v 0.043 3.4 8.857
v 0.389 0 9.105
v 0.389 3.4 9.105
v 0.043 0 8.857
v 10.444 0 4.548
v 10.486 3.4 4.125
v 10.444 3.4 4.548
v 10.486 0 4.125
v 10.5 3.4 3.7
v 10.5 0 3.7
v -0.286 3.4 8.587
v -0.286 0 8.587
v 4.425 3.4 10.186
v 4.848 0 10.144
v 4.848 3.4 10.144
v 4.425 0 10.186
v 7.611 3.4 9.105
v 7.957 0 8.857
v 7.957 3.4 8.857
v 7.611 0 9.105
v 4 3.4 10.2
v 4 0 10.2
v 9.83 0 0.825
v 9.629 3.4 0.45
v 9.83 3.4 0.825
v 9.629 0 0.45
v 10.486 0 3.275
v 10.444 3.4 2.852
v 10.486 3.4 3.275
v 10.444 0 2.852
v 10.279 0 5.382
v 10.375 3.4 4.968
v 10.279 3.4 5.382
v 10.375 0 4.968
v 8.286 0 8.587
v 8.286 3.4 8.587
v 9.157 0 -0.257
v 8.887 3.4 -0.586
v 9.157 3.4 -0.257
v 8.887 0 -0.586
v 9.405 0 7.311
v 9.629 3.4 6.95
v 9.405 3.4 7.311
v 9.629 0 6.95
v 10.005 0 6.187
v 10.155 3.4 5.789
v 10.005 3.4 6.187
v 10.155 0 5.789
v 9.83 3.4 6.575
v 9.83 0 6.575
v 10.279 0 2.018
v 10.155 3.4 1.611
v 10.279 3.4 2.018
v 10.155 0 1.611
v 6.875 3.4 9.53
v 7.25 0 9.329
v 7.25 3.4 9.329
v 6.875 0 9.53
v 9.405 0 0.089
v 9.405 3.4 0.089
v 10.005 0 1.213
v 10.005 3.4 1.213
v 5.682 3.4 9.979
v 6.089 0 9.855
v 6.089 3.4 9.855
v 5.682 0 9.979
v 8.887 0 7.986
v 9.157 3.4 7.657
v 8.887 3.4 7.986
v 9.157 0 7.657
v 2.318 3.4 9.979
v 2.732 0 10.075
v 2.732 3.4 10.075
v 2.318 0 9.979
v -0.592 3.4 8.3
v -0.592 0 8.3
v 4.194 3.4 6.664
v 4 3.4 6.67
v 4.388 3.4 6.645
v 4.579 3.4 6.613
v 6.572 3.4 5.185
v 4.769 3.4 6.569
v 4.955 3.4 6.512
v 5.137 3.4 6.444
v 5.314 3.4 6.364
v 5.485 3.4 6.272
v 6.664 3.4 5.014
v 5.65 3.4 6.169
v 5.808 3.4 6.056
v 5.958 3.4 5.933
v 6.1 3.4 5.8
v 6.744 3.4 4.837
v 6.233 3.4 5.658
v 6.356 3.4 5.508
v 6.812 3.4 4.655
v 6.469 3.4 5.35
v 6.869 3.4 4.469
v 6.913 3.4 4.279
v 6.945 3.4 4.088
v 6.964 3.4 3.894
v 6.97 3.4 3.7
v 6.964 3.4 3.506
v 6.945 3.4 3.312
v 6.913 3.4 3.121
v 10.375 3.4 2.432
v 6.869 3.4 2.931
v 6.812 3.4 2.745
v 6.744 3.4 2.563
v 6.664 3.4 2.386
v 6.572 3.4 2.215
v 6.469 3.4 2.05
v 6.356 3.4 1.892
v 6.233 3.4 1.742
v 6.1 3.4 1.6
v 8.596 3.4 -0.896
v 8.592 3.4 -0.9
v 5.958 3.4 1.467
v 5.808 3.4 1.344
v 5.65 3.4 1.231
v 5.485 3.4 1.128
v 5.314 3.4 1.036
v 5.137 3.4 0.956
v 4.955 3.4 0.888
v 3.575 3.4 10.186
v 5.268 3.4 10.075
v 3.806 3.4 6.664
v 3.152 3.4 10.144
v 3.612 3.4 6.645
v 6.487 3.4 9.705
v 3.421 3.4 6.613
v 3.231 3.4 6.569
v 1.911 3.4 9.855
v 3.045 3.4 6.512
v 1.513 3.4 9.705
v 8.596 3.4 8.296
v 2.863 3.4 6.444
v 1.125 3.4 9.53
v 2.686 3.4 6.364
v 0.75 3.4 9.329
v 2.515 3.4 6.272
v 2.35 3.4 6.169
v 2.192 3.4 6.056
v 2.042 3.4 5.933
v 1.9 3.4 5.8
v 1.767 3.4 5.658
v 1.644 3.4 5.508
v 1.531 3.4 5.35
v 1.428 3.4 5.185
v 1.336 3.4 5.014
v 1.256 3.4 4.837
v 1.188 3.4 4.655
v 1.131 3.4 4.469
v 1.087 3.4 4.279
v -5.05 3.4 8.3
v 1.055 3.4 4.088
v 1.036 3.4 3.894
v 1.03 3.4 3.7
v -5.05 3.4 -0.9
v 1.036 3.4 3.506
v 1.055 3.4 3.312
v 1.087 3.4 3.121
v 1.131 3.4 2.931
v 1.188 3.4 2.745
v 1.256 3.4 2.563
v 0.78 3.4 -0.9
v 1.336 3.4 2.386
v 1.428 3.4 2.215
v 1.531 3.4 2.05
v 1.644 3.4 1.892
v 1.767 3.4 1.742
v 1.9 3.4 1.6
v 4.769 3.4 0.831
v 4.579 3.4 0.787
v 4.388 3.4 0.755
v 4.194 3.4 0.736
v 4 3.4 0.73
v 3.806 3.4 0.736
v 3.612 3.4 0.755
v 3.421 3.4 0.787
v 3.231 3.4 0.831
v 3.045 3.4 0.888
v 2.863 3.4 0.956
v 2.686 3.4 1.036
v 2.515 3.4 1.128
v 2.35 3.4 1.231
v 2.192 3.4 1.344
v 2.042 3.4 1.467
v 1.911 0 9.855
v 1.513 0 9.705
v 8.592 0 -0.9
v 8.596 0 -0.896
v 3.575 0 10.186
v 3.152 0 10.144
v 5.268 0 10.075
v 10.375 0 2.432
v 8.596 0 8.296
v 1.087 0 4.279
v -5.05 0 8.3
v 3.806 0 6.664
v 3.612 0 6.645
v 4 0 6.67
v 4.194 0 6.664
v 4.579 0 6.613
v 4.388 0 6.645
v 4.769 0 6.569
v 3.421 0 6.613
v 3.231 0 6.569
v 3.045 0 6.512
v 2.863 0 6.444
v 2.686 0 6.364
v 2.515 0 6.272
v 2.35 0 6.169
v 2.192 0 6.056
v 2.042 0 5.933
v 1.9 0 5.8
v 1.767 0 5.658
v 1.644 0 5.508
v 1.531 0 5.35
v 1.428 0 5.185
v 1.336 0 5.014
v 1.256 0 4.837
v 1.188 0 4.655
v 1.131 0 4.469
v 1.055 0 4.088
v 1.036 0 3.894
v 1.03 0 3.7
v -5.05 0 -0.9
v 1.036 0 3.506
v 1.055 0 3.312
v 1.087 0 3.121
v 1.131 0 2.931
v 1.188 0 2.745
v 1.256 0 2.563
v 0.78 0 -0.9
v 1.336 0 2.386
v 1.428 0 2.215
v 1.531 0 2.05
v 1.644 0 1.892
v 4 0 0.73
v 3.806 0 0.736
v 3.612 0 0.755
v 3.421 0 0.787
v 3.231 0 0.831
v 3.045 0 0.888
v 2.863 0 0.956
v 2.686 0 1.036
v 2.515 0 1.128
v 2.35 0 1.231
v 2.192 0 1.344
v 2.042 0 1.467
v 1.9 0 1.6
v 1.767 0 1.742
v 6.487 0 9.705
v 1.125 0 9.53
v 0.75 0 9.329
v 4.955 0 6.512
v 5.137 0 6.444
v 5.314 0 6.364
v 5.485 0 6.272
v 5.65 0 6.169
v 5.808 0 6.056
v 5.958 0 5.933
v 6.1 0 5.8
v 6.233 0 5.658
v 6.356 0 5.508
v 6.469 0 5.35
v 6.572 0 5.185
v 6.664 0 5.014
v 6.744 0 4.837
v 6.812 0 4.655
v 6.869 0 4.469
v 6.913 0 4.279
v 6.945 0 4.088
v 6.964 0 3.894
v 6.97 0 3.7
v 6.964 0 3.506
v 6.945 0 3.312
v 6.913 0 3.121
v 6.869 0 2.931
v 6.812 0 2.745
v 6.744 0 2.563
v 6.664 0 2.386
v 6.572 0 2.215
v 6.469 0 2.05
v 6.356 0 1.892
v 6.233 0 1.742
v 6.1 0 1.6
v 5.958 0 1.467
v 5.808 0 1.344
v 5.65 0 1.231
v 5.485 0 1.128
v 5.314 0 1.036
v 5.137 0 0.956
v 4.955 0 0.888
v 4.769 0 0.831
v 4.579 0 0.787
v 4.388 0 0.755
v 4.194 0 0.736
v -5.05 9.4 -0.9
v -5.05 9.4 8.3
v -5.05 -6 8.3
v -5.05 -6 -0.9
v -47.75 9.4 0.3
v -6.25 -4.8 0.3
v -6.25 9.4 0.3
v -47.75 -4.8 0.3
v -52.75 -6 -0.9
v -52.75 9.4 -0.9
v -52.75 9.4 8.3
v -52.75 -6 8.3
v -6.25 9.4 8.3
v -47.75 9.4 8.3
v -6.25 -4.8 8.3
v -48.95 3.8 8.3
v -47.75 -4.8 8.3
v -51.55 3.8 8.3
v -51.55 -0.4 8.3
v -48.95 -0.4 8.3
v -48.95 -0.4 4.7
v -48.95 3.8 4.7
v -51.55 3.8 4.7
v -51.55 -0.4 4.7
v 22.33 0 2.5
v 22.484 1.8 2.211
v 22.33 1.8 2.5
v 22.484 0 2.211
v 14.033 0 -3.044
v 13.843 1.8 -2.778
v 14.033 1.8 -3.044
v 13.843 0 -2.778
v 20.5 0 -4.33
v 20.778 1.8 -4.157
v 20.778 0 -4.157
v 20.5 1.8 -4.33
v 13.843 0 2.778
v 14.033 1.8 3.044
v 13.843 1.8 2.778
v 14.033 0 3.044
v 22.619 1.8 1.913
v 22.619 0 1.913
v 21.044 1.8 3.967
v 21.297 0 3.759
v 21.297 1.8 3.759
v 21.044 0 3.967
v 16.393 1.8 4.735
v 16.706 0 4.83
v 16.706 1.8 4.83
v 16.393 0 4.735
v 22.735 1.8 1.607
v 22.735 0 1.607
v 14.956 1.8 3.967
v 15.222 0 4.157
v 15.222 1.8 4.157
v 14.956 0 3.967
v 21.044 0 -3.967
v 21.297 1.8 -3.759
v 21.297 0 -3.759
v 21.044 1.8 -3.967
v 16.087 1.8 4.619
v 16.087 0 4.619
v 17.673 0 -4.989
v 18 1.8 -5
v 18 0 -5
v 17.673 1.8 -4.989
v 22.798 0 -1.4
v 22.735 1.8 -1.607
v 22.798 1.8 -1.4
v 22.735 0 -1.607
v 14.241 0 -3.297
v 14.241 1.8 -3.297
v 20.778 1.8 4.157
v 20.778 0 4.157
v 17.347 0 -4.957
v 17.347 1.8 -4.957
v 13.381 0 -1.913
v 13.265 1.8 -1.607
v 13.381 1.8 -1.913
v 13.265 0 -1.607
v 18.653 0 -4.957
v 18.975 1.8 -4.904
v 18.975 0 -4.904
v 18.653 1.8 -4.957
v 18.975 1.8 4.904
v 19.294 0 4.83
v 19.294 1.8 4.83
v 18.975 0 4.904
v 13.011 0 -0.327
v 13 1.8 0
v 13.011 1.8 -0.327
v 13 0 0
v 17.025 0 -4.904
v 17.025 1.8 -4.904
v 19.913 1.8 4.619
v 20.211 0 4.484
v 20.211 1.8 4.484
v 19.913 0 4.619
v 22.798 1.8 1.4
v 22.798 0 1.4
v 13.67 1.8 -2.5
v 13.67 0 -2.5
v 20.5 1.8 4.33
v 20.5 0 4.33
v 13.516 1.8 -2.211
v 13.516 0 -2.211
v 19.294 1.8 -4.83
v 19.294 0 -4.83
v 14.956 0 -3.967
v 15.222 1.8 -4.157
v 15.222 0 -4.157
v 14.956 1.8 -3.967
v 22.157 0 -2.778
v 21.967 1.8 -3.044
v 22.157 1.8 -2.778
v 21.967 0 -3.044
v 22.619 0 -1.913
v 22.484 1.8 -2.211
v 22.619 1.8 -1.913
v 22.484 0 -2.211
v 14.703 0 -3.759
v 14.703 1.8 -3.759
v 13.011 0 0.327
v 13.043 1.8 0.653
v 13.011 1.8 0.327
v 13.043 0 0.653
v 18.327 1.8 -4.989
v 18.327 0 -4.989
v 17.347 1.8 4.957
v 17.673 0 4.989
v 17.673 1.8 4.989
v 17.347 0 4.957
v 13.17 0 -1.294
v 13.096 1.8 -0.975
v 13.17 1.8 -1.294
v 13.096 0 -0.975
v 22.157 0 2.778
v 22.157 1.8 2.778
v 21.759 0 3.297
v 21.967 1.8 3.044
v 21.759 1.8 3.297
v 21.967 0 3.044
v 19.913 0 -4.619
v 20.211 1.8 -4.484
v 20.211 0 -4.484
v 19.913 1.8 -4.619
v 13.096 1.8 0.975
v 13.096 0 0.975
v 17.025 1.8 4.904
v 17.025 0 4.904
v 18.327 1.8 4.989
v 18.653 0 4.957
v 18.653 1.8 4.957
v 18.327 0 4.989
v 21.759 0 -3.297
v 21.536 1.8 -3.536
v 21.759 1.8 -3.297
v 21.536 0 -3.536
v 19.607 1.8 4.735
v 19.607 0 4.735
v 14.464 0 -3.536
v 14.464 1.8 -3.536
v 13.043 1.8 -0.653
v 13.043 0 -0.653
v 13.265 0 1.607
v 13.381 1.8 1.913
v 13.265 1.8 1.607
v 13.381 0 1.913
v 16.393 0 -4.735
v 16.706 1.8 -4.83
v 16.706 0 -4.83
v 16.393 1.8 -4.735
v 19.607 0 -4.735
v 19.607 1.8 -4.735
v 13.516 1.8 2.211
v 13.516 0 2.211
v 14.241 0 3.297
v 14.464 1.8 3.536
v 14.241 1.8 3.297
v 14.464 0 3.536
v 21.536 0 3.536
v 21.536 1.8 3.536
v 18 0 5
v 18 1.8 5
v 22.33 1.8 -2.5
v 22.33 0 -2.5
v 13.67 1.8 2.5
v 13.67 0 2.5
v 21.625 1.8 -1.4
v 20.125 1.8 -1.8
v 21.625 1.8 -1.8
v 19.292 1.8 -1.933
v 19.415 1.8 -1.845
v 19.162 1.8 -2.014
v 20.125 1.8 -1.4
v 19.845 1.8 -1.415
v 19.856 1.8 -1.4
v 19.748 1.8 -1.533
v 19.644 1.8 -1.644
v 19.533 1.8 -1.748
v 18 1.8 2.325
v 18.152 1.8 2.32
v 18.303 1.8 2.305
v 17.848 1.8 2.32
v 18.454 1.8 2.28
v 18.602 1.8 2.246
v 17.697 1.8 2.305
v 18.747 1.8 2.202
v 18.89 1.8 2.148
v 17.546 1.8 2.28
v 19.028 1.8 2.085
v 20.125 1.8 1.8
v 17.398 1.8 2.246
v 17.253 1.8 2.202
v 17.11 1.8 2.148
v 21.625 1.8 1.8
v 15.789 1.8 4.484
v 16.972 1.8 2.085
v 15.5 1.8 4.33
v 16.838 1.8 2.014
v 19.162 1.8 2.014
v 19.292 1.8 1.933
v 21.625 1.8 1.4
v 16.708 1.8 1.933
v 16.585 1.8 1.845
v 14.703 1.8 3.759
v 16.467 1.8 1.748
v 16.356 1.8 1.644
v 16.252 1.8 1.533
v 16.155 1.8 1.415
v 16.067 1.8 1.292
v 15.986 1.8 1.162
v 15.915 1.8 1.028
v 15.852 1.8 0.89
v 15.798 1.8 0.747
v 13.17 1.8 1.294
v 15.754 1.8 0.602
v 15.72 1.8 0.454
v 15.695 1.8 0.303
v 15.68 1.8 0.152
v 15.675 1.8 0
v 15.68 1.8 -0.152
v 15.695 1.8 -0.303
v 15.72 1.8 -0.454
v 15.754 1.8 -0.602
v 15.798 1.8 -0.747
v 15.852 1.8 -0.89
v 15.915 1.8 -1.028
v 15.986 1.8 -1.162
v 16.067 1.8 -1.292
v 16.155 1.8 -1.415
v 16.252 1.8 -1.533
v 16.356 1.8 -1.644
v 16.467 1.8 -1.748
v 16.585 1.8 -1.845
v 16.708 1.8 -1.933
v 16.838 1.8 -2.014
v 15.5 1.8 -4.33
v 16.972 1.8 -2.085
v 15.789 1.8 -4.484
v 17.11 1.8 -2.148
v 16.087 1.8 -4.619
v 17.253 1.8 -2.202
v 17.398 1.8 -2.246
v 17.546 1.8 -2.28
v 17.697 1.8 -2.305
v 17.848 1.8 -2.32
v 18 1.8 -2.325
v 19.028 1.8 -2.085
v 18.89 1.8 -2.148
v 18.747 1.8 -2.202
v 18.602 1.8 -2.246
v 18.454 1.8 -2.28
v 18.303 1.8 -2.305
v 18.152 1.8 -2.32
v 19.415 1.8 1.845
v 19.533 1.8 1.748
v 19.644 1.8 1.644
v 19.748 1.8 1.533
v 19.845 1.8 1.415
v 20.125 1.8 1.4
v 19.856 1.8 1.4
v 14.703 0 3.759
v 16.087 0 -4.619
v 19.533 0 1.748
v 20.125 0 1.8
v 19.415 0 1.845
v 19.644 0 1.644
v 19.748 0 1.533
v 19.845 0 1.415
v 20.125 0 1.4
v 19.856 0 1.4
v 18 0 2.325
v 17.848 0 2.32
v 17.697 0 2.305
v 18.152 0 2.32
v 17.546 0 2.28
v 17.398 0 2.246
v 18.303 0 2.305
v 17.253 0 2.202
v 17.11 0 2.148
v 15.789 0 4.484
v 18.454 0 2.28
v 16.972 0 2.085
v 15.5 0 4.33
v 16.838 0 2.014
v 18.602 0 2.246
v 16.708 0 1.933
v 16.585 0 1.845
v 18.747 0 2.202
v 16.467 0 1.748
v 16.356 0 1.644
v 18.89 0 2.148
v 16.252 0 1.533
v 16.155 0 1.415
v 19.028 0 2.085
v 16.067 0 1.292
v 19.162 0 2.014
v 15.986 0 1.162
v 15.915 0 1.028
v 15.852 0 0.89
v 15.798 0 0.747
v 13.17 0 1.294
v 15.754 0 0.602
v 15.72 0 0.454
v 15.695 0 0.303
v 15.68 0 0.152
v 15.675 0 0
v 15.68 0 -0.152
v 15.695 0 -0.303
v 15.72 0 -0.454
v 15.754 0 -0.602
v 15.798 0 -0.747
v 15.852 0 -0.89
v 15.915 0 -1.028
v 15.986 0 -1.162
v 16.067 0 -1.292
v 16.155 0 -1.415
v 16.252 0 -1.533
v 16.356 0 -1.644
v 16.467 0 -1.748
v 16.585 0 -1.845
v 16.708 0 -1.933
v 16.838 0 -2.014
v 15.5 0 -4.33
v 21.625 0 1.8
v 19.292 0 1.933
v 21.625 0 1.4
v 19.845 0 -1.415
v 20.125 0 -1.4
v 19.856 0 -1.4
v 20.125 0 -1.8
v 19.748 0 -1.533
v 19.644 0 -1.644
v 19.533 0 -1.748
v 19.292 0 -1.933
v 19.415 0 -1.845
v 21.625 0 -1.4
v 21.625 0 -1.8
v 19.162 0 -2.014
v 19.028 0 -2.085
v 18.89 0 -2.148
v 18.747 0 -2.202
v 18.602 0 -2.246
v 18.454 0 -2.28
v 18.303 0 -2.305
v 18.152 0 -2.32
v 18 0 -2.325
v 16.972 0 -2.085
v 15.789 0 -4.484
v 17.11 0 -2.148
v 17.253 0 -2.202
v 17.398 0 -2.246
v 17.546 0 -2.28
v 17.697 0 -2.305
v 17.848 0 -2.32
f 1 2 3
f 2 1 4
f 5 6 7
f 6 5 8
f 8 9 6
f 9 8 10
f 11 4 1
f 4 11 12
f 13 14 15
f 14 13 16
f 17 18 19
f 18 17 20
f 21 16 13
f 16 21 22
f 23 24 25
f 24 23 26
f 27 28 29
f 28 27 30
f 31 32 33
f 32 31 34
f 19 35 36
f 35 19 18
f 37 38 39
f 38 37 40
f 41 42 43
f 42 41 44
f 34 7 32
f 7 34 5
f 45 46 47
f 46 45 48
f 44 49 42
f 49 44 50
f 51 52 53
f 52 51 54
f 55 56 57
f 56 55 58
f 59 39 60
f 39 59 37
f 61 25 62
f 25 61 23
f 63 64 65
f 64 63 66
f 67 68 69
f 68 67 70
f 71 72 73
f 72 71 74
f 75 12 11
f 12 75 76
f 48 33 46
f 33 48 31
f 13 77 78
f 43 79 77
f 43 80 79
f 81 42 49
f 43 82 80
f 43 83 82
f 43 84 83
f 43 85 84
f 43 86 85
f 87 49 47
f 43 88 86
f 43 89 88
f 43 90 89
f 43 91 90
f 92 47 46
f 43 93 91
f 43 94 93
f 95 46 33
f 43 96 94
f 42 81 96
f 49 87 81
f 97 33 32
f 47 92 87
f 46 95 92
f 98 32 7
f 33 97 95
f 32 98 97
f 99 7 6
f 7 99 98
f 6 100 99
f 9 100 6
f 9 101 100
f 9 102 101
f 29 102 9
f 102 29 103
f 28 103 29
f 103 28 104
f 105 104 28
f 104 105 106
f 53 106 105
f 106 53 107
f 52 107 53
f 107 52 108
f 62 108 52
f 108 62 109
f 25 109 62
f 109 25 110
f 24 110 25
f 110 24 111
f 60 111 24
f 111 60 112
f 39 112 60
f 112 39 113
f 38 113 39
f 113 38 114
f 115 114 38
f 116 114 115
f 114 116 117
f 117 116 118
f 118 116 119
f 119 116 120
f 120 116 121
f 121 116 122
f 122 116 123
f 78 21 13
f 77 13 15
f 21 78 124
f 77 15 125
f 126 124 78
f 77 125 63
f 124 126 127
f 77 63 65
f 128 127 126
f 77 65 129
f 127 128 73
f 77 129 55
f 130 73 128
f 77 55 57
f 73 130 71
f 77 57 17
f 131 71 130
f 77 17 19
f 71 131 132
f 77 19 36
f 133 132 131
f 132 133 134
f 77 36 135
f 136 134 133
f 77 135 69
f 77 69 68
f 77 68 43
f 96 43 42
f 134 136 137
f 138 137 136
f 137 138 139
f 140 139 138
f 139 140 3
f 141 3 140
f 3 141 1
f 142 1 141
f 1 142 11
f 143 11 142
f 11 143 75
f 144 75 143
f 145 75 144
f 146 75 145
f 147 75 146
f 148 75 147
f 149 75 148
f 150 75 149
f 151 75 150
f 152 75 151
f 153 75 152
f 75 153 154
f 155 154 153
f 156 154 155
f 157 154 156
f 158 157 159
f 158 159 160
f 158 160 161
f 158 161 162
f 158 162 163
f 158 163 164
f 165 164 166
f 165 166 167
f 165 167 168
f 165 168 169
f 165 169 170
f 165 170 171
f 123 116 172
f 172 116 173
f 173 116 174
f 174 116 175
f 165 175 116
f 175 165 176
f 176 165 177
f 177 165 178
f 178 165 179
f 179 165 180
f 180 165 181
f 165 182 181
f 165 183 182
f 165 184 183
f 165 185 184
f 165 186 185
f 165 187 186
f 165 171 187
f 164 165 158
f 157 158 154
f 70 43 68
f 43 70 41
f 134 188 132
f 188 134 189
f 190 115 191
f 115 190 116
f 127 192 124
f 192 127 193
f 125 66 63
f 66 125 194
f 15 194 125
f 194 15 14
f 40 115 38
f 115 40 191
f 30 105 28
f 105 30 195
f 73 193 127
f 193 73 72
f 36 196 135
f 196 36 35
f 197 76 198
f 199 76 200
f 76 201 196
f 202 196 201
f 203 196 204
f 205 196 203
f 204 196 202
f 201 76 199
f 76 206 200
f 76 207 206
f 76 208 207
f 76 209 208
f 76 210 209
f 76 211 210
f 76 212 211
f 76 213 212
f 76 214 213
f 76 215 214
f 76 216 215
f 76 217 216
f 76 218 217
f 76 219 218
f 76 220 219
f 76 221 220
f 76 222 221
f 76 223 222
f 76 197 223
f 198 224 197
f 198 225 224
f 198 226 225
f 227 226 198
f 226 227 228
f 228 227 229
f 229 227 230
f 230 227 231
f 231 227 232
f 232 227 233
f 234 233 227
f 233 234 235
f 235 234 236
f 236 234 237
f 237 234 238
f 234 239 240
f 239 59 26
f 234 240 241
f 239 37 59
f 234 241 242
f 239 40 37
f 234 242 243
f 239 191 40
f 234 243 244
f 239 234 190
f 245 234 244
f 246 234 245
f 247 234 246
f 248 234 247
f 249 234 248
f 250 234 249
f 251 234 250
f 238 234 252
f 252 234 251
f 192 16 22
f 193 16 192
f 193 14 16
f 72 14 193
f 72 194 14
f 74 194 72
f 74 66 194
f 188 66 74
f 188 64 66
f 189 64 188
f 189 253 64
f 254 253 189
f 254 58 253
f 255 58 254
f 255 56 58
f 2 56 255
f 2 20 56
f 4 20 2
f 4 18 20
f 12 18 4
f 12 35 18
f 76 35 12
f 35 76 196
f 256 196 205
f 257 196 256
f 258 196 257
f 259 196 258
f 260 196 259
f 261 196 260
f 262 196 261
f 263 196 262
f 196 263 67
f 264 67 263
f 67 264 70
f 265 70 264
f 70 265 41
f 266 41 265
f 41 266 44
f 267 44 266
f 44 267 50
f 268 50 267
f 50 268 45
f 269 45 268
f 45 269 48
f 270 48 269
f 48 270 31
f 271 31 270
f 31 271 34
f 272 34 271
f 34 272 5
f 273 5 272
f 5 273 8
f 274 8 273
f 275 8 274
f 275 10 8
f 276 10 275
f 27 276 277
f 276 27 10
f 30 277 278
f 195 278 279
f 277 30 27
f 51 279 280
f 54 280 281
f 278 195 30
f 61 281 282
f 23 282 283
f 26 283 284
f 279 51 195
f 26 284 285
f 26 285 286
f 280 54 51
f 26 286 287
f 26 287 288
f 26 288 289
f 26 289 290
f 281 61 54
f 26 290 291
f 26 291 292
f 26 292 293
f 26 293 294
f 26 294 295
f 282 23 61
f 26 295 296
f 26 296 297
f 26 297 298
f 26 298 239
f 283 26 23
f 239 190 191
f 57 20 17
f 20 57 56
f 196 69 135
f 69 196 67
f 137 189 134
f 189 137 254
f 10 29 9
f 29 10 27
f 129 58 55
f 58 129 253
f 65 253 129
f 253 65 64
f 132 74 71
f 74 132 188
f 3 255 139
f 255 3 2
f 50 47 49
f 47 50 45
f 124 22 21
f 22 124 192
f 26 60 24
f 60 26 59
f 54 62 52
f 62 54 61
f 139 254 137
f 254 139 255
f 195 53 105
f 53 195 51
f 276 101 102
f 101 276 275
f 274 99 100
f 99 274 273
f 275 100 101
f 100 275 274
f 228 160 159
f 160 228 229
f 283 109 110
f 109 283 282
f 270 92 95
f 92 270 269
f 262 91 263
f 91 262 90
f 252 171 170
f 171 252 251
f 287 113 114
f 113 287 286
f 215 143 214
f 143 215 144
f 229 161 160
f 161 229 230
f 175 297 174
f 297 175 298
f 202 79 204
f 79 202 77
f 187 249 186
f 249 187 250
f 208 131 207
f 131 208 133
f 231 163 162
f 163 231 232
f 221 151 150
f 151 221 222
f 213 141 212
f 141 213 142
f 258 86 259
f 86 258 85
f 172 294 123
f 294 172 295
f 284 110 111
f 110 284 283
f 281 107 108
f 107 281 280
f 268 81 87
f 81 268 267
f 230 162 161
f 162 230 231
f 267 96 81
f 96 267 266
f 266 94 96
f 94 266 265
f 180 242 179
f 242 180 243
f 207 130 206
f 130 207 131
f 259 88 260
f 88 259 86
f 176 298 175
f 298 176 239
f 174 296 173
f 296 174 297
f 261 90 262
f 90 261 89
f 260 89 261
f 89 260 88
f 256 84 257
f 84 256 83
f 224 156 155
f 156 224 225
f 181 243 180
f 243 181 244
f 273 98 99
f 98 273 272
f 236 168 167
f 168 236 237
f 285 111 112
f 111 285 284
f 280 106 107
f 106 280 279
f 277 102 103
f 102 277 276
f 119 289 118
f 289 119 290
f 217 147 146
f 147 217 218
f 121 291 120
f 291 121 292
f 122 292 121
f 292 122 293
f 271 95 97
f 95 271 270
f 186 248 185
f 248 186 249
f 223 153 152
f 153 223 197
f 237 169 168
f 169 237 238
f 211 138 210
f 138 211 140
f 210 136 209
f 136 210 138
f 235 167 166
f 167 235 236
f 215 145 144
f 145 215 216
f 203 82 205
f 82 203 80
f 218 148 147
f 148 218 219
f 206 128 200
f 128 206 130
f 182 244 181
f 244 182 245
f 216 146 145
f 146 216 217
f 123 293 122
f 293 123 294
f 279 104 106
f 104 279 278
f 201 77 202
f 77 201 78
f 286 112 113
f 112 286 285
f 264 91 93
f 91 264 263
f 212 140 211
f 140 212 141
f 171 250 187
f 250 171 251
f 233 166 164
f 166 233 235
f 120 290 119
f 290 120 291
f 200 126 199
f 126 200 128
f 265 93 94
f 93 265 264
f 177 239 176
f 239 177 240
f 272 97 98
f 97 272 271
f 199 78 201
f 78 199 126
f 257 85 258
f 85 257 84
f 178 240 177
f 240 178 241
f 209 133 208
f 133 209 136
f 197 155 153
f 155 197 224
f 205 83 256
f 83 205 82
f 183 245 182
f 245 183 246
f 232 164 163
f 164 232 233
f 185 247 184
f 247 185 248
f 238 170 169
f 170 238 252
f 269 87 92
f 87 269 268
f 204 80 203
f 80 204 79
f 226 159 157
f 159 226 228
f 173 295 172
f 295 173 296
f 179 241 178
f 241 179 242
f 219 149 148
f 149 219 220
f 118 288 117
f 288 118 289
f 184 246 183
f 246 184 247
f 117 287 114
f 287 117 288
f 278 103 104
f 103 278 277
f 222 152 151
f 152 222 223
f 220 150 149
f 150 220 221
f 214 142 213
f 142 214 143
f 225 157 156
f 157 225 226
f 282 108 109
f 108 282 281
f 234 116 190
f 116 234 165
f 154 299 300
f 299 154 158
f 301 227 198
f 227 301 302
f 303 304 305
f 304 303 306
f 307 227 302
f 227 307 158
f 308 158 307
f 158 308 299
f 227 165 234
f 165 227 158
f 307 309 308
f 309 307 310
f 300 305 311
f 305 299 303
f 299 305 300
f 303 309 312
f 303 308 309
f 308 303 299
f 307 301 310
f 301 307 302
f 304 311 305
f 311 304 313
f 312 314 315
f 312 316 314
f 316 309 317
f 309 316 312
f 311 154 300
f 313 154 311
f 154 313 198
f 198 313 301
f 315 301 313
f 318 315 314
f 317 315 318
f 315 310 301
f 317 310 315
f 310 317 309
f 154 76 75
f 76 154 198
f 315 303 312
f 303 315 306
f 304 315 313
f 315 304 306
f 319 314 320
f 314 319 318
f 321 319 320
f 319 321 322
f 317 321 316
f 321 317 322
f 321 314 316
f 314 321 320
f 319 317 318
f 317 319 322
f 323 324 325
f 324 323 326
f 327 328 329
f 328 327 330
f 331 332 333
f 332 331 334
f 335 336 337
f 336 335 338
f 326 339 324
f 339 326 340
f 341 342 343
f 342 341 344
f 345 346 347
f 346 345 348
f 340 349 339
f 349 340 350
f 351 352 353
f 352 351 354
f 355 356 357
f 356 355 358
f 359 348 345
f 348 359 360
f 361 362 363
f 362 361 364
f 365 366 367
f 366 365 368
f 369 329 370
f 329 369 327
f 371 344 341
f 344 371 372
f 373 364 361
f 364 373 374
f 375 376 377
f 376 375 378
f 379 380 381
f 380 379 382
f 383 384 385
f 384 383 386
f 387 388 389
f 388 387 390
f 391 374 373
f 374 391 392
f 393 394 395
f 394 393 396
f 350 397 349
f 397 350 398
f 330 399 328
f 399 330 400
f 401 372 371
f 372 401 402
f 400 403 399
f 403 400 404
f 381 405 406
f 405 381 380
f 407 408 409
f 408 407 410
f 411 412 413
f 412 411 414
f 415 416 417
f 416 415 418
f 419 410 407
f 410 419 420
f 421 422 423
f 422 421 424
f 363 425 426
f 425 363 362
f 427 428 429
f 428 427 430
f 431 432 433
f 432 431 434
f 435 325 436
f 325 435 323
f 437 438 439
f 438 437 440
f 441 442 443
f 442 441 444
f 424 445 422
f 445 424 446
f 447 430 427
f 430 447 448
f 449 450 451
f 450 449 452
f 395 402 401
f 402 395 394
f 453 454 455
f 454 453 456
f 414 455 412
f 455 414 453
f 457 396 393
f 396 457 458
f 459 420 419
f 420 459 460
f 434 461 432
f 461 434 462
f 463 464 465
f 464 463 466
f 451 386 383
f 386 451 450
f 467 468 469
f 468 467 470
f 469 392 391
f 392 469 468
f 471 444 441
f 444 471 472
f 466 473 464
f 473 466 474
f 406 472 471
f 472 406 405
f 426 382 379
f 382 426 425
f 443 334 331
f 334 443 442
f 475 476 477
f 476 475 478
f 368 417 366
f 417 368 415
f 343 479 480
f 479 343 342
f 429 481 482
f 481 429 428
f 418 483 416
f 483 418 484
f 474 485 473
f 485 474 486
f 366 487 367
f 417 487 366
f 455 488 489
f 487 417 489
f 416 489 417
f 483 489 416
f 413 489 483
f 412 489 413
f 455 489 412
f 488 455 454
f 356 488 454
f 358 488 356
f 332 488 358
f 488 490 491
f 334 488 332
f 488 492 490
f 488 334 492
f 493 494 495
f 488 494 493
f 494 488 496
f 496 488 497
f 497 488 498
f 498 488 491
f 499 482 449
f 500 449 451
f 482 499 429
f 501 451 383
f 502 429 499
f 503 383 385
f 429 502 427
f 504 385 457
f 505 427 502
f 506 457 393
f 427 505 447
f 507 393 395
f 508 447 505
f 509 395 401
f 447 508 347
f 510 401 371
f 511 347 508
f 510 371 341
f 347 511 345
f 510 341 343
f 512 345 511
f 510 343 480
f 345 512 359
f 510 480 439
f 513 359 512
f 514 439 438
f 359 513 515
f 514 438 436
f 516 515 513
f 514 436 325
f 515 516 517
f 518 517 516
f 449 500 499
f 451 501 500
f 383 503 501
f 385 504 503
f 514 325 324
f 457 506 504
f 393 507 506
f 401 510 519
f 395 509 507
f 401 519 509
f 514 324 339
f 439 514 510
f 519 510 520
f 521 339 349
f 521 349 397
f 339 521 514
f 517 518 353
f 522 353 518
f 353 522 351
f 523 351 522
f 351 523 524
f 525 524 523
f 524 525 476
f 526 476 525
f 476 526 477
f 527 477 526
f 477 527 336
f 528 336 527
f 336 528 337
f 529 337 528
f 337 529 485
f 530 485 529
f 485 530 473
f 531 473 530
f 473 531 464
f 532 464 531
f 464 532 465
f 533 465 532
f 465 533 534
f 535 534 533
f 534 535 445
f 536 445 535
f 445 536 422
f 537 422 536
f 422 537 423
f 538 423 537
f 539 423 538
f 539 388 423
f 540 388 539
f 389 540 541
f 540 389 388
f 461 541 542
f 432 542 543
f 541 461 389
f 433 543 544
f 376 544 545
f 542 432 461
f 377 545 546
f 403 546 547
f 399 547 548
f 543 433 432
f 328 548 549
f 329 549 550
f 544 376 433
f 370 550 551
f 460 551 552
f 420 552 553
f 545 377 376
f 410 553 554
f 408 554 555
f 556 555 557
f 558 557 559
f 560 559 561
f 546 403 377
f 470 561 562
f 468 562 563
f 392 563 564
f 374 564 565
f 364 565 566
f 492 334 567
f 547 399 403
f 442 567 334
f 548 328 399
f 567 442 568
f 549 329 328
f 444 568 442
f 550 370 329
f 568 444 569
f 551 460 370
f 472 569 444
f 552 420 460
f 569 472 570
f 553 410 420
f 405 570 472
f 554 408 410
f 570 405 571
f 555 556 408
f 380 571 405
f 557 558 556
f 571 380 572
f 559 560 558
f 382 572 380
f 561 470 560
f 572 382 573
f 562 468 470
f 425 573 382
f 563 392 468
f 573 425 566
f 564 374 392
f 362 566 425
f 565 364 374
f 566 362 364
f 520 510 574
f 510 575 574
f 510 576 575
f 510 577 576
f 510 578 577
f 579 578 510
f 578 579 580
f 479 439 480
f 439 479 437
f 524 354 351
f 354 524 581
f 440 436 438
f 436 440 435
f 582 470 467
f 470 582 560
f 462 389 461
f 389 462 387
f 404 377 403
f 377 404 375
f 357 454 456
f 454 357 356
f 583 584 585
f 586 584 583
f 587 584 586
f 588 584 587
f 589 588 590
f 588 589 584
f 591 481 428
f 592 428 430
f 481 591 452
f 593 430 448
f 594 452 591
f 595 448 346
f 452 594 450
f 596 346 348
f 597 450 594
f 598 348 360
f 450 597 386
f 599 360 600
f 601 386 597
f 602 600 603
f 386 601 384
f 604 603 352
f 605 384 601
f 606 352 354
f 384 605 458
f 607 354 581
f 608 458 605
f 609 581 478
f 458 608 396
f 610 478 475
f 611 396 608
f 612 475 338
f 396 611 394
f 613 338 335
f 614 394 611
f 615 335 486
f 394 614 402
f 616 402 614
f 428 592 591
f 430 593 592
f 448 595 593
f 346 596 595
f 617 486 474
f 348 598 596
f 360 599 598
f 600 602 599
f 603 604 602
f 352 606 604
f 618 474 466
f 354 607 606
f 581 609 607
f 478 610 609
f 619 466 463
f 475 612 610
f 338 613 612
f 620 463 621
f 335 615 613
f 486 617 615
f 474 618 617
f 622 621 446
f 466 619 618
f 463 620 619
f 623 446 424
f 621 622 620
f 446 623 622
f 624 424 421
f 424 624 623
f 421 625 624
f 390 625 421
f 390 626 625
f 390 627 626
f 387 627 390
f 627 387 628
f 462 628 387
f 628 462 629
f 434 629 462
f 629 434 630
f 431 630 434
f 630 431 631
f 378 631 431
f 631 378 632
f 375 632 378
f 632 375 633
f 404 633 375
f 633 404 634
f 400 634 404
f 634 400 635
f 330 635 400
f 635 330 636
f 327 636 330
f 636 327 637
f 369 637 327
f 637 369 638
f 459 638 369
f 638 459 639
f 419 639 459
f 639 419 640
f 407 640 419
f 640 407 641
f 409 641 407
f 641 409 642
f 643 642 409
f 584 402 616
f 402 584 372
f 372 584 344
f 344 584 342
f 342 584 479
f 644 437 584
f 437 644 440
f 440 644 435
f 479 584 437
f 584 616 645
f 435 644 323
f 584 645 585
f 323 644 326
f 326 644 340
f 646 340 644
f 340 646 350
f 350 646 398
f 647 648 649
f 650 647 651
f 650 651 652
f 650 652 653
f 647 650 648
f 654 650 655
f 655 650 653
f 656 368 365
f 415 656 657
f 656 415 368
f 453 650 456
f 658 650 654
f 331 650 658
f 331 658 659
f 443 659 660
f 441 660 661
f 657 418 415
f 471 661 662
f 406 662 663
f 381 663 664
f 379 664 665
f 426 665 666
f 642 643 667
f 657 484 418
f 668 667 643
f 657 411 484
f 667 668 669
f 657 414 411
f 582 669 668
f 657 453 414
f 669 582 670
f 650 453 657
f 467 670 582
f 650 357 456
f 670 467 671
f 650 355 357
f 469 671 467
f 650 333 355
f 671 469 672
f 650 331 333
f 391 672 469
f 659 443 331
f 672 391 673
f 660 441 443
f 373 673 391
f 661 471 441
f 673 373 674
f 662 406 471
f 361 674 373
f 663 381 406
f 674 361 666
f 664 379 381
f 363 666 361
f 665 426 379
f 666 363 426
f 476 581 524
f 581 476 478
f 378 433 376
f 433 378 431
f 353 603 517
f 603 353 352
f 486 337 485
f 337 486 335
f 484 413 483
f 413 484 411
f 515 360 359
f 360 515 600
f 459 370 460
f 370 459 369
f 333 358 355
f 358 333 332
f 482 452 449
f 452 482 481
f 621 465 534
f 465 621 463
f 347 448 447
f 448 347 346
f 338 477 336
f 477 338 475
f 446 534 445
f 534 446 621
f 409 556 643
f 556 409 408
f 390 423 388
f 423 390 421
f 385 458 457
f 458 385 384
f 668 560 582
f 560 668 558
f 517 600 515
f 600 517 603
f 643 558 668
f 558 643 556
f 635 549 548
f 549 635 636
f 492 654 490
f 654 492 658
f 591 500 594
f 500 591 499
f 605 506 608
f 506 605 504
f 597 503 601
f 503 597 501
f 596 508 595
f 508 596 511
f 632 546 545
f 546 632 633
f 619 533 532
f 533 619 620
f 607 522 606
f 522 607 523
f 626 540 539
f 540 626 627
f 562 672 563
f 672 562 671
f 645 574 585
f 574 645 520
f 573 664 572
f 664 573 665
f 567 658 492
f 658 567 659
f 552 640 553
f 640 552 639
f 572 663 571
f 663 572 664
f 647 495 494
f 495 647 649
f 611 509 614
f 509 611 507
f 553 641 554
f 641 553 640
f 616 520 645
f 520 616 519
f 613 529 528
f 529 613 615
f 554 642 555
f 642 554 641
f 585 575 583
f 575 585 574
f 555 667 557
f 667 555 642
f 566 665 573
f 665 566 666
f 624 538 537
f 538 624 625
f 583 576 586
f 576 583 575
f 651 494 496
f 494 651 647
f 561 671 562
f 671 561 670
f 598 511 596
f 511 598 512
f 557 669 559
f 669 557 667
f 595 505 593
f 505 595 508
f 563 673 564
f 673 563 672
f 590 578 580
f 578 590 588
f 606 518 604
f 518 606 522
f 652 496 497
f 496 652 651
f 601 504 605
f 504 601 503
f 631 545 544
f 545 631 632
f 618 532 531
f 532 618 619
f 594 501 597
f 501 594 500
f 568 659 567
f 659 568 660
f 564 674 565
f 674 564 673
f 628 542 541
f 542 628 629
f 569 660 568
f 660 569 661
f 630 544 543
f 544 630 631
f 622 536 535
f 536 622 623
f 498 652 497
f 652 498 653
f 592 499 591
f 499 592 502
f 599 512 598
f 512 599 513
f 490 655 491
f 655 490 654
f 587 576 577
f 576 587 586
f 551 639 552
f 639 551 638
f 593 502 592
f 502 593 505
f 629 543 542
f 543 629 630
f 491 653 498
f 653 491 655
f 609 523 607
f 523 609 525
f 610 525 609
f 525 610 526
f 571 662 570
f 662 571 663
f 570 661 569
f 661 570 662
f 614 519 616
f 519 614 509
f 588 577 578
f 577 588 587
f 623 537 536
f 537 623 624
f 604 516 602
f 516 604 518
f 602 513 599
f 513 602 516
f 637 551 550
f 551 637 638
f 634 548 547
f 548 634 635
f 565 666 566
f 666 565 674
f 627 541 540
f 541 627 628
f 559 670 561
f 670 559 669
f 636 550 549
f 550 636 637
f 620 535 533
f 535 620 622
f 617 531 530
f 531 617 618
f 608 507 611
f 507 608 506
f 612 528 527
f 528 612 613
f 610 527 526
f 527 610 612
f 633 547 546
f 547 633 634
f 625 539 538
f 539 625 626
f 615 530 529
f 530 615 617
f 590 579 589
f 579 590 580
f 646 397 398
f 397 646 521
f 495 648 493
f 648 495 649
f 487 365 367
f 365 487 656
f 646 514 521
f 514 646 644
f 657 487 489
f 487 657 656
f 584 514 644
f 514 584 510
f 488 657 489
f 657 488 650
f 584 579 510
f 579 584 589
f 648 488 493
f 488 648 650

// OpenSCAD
// DOUBLE TAKE FRAMES DESIGN RELEASE
// DTF_RELEASE: 1.0.0
// Released: 2026-08-30
// Versioning: Semantic Versioning 2.0.0 (https://semver.org/)
// Status: CANONICAL
// Changes in 1.0.0:
// - Initial versioned public design release.
// - Establishes the current accepted geometry as the 1.x compatibility baseline.
// Full release notes: https://doubletakeframes.com/build/#design-release
//
$fn = 96;

eps = 0.05;

// 0 = separated printable latch and keeper
// 1 = FN-weight latch only
// 2 = C-shaped keeper only
render_part = 0;

// =========================================================
// FN WEIGHT LATCH
// =========================================================
post_d = 5.5;
clear_radial = 0.22;
eye_inner_d = post_d + 2 * clear_radial;
eye_outer_d = 13.0;

latch_t = 3.4;
pivot_x = 4.0;

corral_clear_w_x = 41.5;
corral_clear_d_y = 13.0;
corral_wall_t = 1.2;
corral_depth_z = 8.0;
corral_floor_t = 1.2;
corral_end_wall_t_x = 5.0;
canonical_weight_center_x = -27.0;

// Match the installed latch plane used by the canonical dry-wall rig.
standoff_h = 0.8;
post_h = 4.0;
corral_global_outer_y1 = -0.30;
corral_center_y_target = corral_global_outer_y1
                         - (corral_clear_d_y + 2 * corral_wall_t) / 2;
pad_t = -corral_center_y_target - standoff_h - post_h / 2;
post_y1 = -pad_t - standoff_h - post_h;
latch_install_y = post_y1 + (post_h - latch_t) / 2;

corral_inner_x0 = canonical_weight_center_x - corral_clear_w_x / 2;
corral_inner_x1 = canonical_weight_center_x + corral_clear_w_x / 2;
corral_floor_x0 = corral_inner_x0 - corral_end_wall_t_x;
corral_floor_x1 = corral_inner_x1 + corral_wall_t;

corral_outer_y1 = corral_global_outer_y1 - latch_install_y;
corral_inner_y1 = corral_outer_y1 - corral_wall_t;
corral_inner_y0 = corral_inner_y1 - corral_clear_d_y;
corral_outer_y0 = corral_inner_y0 - corral_wall_t;

corral_floor_z0 = -0.90;
corral_floor_z = corral_floor_z0 + corral_floor_t;
corral_wall_z1 = corral_floor_z + corral_depth_z;
pivot_z = (corral_floor_z0 + corral_wall_z1) / 2;
pivot_eye_flat_local_z = corral_floor_z0 - pivot_z;

pivot_transition_x0 = corral_floor_x1;
pivot_transition_x1 = pivot_x - (eye_inner_d / 2 + 0.25);

// Far-end Y-retention socket. The matching roof-hung tooth belongs to the
// fixed dry-wall rig; this socket is open at the top so the latch disengages
// cleanly as it swings downward.
latch_key_tooth_w_x = 1.4;
latch_key_tooth_w_y = 3.0;
latch_key_clear_xy = 0.60;
latch_key_clear_z = 0.60;
latch_key_engagement_z = 3.0;

latch_key_xc = (corral_floor_x0 + corral_inner_x0) / 2;
latch_key_local_yc = (corral_outer_y0 + corral_outer_y1) / 2;
latch_key_notch_x0 = latch_key_xc - latch_key_tooth_w_x / 2
                     - latch_key_clear_xy;
latch_key_notch_x1 = latch_key_xc + latch_key_tooth_w_x / 2
                     + latch_key_clear_xy;
latch_key_notch_y0 = latch_key_local_yc - latch_key_tooth_w_y / 2
                     - latch_key_clear_xy;
latch_key_notch_y1 = latch_key_local_yc + latch_key_tooth_w_y / 2
                     + latch_key_clear_xy;
latch_key_notch_z0 = corral_wall_z1 - latch_key_engagement_z
                     - latch_key_clear_z;

// =========================================================
// C-SHAPED KEEPER
// =========================================================
clip_outer_d = 10.0;
clip_t = 1.8;
grip_hole_d = 4.65;
gap_w = 2.8;
flat_depth = 1.5;

// =========================================================
// HELPERS
// =========================================================
module rect_prism(x0, x1, y0, y1, z0, z1) {
    translate([min(x0, x1), min(y0, y1), min(z0, z1)])
        cube([abs(x1 - x0), abs(y1 - y0), abs(z1 - z0)]);
}

module cyl_y_span(d, y0, y1) {
    translate([0, max(y0, y1), 0])
        rotate([90, 0, 0])
            cylinder(d=d, h=abs(y1 - y0), center=false);
}

// =========================================================
// PRINTABLE PARTS
// =========================================================
module canonical_latch_core() {
    translate([pivot_x, 0, pivot_z])
        difference() {
            cyl_y_span(eye_outer_d, 0, latch_t);
            cyl_y_span(eye_inner_d, -0.1, latch_t + 0.2);

            // Flatten only the unused lower eye arc so the complete latch
            // prints on the same plane as the corral floor.
            rect_prism(-eye_outer_d / 2 - 1,
                       eye_outer_d / 2 + 1,
                       -0.1, latch_t + 0.2,
                       -eye_outer_d / 2 - 1,
                       pivot_eye_flat_local_z);
        }
}

module fn_weight_corral() {
    difference() {
        union() {
            // Shallow floor beneath the weight pocket and keyed extension.
            rect_prism(corral_floor_x0, corral_floor_x1,
                       corral_outer_y0, corral_outer_y1,
                       corral_floor_z0, corral_floor_z);

            // Viewer-facing wall. The frame wall closes the opposite side.
            rect_prism(corral_inner_x0, corral_inner_x1,
                       corral_outer_y0, corral_inner_y0,
                       corral_floor_z, corral_wall_z1);

            // Pivot-side wall.
            rect_prism(corral_inner_x1, corral_floor_x1,
                       corral_outer_y0, corral_outer_y1,
                       corral_floor_z, corral_wall_z1);

            // Substantial far-end wall carrying the retention socket.
            rect_prism(corral_floor_x0, corral_inner_x0,
                       corral_outer_y0, corral_outer_y1,
                       corral_floor_z, corral_wall_z1);

            // Compact load path from the corral into the pivot eye.
            rect_prism(pivot_transition_x0, pivot_transition_x1,
                       0, latch_t,
                       corral_floor_z0, corral_wall_z1);
        }

        rect_prism(latch_key_notch_x0, latch_key_notch_x1,
                   latch_key_notch_y0, latch_key_notch_y1,
                   latch_key_notch_z0, corral_wall_z1 + eps);
    }
}

module swinging_latch() {
    union() {
        canonical_latch_core();
        fn_weight_corral();
    }
}

module c_keeper() {
    difference() {
        cyl_y_span(clip_outer_d, 0, clip_t);
        cyl_y_span(grip_hole_d, -0.1, clip_t + 0.2);

        rect_prism(0, clip_outer_d / 2 + 0.5,
                   -0.1, clip_t + 0.1,
                   -gap_w / 2, gap_w / 2);

        rect_prism(grip_hole_d / 2 - 0.2,
                   grip_hole_d / 2 - 0.2 + flat_depth,
                   -0.1, clip_t + 0.1,
                   -gap_w / 2 - 0.4, gap_w / 2 + 0.4);
    }
}

assert(corral_clear_w_x == 41.5);
assert(corral_clear_d_y == 13.0);
assert(pivot_transition_x1 > pivot_transition_x0);

if (render_part == 1)
    swinging_latch();
else if (render_part == 2)
    c_keeper();
else {
    swinging_latch();
    translate([18, 0, 0]) c_keeper();
}
